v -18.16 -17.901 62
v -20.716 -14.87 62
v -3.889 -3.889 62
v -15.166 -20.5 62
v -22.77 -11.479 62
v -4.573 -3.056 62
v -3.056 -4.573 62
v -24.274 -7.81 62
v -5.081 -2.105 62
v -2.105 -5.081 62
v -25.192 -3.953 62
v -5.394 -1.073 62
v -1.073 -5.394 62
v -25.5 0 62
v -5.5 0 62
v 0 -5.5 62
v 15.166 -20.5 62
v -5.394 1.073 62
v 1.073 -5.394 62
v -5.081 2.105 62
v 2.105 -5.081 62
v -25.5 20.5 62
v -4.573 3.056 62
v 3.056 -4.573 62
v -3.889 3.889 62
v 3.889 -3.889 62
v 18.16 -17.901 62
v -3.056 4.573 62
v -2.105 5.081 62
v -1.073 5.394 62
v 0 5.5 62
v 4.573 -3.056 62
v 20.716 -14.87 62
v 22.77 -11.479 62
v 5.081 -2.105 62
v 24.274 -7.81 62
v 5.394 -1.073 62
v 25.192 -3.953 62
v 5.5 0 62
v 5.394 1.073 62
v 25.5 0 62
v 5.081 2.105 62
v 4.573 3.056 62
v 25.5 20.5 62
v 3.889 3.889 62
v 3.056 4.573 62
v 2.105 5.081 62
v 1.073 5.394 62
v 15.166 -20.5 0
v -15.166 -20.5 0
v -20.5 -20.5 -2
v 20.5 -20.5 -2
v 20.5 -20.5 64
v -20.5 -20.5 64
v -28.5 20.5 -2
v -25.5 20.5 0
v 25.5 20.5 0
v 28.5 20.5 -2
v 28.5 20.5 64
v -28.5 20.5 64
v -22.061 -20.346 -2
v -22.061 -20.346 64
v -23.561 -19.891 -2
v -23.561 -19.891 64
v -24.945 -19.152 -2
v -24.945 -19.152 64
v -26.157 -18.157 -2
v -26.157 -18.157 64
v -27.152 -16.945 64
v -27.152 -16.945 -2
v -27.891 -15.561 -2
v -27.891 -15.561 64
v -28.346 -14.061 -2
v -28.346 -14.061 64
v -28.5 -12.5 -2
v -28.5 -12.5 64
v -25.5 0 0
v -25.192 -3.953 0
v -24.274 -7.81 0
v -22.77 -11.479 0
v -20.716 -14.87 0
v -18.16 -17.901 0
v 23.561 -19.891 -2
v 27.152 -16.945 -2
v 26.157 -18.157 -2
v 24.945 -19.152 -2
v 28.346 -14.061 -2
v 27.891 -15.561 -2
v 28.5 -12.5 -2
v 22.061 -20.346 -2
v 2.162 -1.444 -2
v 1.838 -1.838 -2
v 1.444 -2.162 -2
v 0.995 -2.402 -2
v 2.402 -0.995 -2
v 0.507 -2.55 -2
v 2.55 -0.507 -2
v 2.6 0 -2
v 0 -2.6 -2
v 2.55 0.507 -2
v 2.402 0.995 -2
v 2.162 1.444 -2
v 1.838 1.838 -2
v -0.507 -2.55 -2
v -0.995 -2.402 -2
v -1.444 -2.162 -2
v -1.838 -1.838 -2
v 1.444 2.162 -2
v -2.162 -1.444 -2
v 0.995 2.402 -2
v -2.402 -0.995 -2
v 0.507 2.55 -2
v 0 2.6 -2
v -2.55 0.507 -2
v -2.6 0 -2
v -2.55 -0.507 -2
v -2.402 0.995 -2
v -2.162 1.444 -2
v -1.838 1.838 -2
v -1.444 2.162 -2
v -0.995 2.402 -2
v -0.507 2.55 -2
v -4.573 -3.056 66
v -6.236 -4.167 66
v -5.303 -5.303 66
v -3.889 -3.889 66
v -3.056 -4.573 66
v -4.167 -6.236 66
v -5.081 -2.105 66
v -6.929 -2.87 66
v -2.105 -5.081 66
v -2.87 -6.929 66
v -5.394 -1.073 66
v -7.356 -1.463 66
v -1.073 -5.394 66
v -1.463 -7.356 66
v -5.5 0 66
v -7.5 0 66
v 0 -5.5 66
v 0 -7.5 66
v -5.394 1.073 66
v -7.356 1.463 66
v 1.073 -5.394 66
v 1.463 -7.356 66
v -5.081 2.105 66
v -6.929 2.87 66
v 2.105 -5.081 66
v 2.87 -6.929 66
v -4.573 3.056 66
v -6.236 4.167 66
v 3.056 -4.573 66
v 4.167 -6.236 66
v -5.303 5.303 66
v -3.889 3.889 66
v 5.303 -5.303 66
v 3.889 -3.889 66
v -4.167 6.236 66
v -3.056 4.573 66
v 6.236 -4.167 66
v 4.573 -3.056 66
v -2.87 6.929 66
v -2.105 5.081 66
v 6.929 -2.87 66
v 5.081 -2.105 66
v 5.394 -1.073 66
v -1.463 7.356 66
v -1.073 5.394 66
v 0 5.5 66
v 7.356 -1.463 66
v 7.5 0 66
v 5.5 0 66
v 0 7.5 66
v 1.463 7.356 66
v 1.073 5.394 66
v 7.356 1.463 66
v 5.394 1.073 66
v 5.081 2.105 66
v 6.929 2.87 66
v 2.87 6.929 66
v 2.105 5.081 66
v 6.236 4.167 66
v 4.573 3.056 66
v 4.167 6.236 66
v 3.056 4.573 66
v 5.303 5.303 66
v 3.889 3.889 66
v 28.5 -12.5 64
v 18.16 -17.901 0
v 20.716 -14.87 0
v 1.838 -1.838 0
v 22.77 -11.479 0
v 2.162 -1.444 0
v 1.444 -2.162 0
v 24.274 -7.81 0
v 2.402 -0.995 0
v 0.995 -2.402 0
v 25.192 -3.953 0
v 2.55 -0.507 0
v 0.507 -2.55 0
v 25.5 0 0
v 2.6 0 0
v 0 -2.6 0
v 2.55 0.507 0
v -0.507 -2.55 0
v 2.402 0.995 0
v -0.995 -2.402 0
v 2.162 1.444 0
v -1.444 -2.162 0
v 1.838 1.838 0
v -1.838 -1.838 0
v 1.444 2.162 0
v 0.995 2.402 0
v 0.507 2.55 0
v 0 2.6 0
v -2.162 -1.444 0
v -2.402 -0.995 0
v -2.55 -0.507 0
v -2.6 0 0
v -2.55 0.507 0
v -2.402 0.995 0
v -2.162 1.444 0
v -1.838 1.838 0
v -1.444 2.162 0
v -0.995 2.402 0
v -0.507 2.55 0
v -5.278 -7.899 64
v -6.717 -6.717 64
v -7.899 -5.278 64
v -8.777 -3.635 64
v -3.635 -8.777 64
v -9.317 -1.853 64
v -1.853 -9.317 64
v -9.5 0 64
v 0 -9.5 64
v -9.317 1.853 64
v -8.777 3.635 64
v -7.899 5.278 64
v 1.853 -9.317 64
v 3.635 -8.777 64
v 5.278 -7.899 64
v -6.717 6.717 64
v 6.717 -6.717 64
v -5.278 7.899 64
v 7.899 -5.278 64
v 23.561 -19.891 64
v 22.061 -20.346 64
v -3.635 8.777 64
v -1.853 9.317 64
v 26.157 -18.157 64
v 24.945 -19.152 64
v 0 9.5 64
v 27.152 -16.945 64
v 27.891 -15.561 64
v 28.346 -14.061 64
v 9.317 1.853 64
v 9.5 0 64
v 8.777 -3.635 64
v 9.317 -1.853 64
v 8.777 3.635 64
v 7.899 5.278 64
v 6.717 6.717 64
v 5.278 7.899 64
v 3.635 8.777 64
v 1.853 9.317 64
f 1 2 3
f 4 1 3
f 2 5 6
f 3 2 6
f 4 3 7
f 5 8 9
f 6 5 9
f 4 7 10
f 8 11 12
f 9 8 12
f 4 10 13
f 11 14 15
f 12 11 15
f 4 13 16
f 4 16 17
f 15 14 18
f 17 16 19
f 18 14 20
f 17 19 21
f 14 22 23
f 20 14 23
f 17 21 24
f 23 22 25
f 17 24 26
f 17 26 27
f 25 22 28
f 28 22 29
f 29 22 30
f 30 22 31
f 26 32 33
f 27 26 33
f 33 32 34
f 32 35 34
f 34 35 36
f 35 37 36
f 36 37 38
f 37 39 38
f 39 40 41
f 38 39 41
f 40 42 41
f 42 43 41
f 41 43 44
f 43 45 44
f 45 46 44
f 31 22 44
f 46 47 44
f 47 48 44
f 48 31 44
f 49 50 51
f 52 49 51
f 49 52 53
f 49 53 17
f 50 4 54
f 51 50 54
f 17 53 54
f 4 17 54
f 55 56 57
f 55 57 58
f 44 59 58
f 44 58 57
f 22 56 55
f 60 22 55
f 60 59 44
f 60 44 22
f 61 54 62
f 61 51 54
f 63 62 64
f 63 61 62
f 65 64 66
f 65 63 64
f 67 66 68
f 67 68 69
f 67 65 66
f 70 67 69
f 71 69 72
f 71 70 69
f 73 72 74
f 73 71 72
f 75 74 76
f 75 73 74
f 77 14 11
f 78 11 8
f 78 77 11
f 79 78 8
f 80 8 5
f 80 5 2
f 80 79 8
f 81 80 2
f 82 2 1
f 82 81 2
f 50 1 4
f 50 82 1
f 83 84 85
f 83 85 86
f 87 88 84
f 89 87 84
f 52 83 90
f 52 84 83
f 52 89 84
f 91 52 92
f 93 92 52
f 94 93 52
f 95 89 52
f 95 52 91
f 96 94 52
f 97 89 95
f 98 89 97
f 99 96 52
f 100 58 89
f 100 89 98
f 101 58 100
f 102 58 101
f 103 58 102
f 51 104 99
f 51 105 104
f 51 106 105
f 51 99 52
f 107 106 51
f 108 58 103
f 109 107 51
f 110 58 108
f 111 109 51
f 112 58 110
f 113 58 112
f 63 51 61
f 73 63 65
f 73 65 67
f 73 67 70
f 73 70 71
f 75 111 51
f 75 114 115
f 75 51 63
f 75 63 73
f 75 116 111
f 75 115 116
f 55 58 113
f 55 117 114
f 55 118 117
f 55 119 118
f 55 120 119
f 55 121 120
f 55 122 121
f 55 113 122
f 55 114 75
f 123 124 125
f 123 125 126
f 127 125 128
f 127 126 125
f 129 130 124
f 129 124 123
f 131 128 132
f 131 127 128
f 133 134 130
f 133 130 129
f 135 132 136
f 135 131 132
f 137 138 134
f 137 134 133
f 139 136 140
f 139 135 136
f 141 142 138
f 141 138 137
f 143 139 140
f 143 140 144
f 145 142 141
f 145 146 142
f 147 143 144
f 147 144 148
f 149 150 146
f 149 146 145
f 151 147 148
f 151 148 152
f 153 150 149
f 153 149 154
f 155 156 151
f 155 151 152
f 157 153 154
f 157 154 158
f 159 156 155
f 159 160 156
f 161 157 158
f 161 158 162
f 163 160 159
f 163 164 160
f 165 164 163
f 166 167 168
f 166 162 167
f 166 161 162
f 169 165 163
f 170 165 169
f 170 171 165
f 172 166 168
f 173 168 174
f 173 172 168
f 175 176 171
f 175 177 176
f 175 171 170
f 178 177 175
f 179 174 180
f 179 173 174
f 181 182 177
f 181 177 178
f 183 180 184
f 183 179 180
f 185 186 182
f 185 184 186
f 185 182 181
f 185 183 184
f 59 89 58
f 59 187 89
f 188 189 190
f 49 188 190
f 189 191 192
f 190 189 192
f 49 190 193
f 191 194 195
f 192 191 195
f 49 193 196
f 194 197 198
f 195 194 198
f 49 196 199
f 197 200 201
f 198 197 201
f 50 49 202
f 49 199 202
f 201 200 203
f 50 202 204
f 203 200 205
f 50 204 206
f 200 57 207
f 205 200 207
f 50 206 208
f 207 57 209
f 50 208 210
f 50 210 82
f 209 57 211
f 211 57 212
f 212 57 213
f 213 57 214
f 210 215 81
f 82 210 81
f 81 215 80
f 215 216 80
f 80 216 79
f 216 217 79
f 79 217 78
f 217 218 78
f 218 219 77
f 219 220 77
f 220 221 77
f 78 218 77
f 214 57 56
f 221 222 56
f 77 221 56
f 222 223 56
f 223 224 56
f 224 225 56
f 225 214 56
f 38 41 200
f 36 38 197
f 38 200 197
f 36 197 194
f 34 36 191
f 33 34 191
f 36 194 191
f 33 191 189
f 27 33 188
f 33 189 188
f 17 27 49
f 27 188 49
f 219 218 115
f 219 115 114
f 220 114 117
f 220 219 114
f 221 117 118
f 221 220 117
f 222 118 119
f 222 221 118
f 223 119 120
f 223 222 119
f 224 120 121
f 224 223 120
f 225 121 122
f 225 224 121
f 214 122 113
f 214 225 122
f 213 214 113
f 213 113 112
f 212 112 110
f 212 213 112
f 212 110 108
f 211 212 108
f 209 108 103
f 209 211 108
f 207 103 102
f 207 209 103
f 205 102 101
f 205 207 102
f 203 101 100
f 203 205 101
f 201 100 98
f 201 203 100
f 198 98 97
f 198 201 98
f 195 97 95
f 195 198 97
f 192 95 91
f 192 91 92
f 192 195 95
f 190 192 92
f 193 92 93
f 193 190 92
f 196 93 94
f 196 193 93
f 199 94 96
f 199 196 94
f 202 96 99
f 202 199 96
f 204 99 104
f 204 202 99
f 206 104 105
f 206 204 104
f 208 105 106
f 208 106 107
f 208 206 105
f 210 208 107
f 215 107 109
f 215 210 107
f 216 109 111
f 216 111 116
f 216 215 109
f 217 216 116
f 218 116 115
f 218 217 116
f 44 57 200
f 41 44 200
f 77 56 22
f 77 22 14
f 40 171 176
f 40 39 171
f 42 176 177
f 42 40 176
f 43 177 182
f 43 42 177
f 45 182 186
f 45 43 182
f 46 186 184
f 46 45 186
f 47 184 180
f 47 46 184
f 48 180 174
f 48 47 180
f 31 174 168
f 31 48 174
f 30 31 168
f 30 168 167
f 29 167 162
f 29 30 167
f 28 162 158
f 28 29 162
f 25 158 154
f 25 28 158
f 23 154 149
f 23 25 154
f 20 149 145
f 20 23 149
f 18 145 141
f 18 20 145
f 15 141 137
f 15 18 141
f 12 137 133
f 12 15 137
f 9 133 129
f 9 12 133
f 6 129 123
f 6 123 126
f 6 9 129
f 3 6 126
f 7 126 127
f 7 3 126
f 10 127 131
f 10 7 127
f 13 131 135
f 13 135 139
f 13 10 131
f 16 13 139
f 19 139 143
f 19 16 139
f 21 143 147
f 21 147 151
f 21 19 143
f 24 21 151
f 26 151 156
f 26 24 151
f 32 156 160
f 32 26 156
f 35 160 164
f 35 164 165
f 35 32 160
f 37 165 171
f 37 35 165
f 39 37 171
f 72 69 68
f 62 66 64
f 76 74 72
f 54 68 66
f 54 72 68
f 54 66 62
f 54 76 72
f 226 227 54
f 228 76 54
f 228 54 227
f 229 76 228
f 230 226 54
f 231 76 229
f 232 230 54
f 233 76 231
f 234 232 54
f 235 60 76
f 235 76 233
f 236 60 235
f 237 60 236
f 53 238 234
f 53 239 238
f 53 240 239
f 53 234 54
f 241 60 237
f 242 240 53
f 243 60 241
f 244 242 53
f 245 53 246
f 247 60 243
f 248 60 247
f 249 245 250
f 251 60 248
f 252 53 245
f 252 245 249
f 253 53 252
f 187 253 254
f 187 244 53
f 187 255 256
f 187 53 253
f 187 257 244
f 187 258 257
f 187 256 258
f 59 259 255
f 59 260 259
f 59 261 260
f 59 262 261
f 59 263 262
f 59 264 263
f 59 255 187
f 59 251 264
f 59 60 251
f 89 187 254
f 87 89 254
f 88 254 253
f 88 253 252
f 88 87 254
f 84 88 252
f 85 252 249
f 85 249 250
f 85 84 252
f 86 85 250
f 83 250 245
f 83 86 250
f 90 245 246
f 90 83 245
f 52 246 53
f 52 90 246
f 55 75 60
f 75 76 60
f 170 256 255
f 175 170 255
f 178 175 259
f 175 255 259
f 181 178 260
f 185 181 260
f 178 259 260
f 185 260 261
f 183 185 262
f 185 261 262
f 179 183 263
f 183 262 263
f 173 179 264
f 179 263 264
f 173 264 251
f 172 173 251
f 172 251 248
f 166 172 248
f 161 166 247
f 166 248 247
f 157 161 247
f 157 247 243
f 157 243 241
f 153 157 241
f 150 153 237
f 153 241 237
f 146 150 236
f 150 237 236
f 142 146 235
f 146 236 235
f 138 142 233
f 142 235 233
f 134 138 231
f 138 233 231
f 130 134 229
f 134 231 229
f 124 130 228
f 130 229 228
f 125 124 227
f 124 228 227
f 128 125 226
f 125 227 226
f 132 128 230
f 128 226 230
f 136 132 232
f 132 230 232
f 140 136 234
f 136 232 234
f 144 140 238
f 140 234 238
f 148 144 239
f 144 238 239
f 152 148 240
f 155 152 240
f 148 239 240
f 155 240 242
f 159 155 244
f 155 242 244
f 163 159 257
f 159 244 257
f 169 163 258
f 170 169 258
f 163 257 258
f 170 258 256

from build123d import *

# Parameters (mm, degrees)
ESTRUSIONE_ESTRUSIONE1_DEPTH   = 62
ESTRUSIONE_ESTRUSIONE1_2_DEPTH = 62
SCHIZZO2_W                     = 57
SCHIZZO2_H                     = 41
SCHIZZO2_R                     = 5.5
ESTRUSIONE_ESTRUSIONE2_DEPTH   = 2
SCHIZZO3_R                     = 7.5
SCHIZZO3_R_2                   = 5.5
ESTRUSIONE_ESTRUSIONE3_DEPTH   = 2
SMUSSO1_SIZE                   = 2
SCHIZZO4_W                     = 57
SCHIZZO4_H                     = 41
SCHIZZO4_R                     = 2.6
ESTRUSIONE_ESTRUSIONE4_DEPTH   = 2
RACCORDO1_R                    = 8


with BuildPart() as part:
    # Schizzo1 → Estrusione-Estrusione1 (new body)
    with BuildSketch(Plane.XY):
        with BuildLine():
            Line((-28.5, -20.5), (-28.5, 20.5))
            Line((-28.5, 20.5), (-25.5, 20.5))
            Line((-25.5, 20.5), (-25.5, 0))
            ThreePointArc((-25.5, 0), (-22.770338685, -11.478748894), (-15.165750888, -20.5))
            Line((-15.165750888, -20.5), (-28.5, -20.5))
        make_face()
    extrude(amount=ESTRUSIONE_ESTRUSIONE1_DEPTH)



with BuildPart() as body_2:
    # Schizzo1 → Estrusione-Estrusione1 2 (new body)
    with BuildSketch(Plane.XY):
        with BuildLine():
            Line((28.5, 20.5), (25.5, 20.5))
            Line((25.5, 20.5), (25.5, 0))
            ThreePointArc((25.5, 0), (22.770338685, -11.478748894), (15.165750888, -20.5))
            Line((15.165750888, -20.5), (28.5, -20.5))
            Line((28.5, -20.5), (28.5, 20.5))
        make_face()
    extrude(amount=ESTRUSIONE_ESTRUSIONE1_2_DEPTH)


with BuildPart() as part_1:
    add(part.part)

    add(body_2.part)  # Estrusione-Estrusione2 merges body 2
    # Schizzo2 → Estrusione-Estrusione2 (add)
    with BuildSketch(Plane.XY.offset(62)):
        Rectangle(SCHIZZO2_W, SCHIZZO2_H)
        Circle(SCHIZZO2_R, mode=Mode.SUBTRACT)
    extrude(amount=ESTRUSIONE_ESTRUSIONE2_DEPTH)

    # Schizzo3 → Estrusione-Estrusione3 (add)
    with BuildSketch(Plane.XY.offset(64)):
        Circle(SCHIZZO3_R)
        Circle(SCHIZZO3_R_2, mode=Mode.SUBTRACT)
    extrude(amount=ESTRUSIONE_ESTRUSIONE3_DEPTH)

    # Smusso1
    smusso1_edges = [part_1.edges().sort_by_distance(p)[0] for p in [
        (-7.5, 0, 64),
    ]]
    chamfer(smusso1_edges, length=SMUSSO1_SIZE - 0.0001)  # a hair under: the kernel refuses the full size

    # Schizzo4 → Estrusione-Estrusione4 (add)
    with BuildSketch(Plane(origin=(0, 0, 0), x_dir=(-1, 0, 0), z_dir=(0, 0, -1))):
        Rectangle(SCHIZZO4_W, SCHIZZO4_H)
        Circle(SCHIZZO4_R, mode=Mode.SUBTRACT)
    extrude(amount=ESTRUSIONE_ESTRUSIONE4_DEPTH)

    # Raccordo1
    raccordo1_edges = [part_1.edges().sort_by_distance(p)[0] for p in [
        (-28.5, -20.5, 31),
        (28.5, -20.5, 31),
    ]]
    fillet(raccordo1_edges, radius=RACCORDO1_R)


solid = part_1.part
